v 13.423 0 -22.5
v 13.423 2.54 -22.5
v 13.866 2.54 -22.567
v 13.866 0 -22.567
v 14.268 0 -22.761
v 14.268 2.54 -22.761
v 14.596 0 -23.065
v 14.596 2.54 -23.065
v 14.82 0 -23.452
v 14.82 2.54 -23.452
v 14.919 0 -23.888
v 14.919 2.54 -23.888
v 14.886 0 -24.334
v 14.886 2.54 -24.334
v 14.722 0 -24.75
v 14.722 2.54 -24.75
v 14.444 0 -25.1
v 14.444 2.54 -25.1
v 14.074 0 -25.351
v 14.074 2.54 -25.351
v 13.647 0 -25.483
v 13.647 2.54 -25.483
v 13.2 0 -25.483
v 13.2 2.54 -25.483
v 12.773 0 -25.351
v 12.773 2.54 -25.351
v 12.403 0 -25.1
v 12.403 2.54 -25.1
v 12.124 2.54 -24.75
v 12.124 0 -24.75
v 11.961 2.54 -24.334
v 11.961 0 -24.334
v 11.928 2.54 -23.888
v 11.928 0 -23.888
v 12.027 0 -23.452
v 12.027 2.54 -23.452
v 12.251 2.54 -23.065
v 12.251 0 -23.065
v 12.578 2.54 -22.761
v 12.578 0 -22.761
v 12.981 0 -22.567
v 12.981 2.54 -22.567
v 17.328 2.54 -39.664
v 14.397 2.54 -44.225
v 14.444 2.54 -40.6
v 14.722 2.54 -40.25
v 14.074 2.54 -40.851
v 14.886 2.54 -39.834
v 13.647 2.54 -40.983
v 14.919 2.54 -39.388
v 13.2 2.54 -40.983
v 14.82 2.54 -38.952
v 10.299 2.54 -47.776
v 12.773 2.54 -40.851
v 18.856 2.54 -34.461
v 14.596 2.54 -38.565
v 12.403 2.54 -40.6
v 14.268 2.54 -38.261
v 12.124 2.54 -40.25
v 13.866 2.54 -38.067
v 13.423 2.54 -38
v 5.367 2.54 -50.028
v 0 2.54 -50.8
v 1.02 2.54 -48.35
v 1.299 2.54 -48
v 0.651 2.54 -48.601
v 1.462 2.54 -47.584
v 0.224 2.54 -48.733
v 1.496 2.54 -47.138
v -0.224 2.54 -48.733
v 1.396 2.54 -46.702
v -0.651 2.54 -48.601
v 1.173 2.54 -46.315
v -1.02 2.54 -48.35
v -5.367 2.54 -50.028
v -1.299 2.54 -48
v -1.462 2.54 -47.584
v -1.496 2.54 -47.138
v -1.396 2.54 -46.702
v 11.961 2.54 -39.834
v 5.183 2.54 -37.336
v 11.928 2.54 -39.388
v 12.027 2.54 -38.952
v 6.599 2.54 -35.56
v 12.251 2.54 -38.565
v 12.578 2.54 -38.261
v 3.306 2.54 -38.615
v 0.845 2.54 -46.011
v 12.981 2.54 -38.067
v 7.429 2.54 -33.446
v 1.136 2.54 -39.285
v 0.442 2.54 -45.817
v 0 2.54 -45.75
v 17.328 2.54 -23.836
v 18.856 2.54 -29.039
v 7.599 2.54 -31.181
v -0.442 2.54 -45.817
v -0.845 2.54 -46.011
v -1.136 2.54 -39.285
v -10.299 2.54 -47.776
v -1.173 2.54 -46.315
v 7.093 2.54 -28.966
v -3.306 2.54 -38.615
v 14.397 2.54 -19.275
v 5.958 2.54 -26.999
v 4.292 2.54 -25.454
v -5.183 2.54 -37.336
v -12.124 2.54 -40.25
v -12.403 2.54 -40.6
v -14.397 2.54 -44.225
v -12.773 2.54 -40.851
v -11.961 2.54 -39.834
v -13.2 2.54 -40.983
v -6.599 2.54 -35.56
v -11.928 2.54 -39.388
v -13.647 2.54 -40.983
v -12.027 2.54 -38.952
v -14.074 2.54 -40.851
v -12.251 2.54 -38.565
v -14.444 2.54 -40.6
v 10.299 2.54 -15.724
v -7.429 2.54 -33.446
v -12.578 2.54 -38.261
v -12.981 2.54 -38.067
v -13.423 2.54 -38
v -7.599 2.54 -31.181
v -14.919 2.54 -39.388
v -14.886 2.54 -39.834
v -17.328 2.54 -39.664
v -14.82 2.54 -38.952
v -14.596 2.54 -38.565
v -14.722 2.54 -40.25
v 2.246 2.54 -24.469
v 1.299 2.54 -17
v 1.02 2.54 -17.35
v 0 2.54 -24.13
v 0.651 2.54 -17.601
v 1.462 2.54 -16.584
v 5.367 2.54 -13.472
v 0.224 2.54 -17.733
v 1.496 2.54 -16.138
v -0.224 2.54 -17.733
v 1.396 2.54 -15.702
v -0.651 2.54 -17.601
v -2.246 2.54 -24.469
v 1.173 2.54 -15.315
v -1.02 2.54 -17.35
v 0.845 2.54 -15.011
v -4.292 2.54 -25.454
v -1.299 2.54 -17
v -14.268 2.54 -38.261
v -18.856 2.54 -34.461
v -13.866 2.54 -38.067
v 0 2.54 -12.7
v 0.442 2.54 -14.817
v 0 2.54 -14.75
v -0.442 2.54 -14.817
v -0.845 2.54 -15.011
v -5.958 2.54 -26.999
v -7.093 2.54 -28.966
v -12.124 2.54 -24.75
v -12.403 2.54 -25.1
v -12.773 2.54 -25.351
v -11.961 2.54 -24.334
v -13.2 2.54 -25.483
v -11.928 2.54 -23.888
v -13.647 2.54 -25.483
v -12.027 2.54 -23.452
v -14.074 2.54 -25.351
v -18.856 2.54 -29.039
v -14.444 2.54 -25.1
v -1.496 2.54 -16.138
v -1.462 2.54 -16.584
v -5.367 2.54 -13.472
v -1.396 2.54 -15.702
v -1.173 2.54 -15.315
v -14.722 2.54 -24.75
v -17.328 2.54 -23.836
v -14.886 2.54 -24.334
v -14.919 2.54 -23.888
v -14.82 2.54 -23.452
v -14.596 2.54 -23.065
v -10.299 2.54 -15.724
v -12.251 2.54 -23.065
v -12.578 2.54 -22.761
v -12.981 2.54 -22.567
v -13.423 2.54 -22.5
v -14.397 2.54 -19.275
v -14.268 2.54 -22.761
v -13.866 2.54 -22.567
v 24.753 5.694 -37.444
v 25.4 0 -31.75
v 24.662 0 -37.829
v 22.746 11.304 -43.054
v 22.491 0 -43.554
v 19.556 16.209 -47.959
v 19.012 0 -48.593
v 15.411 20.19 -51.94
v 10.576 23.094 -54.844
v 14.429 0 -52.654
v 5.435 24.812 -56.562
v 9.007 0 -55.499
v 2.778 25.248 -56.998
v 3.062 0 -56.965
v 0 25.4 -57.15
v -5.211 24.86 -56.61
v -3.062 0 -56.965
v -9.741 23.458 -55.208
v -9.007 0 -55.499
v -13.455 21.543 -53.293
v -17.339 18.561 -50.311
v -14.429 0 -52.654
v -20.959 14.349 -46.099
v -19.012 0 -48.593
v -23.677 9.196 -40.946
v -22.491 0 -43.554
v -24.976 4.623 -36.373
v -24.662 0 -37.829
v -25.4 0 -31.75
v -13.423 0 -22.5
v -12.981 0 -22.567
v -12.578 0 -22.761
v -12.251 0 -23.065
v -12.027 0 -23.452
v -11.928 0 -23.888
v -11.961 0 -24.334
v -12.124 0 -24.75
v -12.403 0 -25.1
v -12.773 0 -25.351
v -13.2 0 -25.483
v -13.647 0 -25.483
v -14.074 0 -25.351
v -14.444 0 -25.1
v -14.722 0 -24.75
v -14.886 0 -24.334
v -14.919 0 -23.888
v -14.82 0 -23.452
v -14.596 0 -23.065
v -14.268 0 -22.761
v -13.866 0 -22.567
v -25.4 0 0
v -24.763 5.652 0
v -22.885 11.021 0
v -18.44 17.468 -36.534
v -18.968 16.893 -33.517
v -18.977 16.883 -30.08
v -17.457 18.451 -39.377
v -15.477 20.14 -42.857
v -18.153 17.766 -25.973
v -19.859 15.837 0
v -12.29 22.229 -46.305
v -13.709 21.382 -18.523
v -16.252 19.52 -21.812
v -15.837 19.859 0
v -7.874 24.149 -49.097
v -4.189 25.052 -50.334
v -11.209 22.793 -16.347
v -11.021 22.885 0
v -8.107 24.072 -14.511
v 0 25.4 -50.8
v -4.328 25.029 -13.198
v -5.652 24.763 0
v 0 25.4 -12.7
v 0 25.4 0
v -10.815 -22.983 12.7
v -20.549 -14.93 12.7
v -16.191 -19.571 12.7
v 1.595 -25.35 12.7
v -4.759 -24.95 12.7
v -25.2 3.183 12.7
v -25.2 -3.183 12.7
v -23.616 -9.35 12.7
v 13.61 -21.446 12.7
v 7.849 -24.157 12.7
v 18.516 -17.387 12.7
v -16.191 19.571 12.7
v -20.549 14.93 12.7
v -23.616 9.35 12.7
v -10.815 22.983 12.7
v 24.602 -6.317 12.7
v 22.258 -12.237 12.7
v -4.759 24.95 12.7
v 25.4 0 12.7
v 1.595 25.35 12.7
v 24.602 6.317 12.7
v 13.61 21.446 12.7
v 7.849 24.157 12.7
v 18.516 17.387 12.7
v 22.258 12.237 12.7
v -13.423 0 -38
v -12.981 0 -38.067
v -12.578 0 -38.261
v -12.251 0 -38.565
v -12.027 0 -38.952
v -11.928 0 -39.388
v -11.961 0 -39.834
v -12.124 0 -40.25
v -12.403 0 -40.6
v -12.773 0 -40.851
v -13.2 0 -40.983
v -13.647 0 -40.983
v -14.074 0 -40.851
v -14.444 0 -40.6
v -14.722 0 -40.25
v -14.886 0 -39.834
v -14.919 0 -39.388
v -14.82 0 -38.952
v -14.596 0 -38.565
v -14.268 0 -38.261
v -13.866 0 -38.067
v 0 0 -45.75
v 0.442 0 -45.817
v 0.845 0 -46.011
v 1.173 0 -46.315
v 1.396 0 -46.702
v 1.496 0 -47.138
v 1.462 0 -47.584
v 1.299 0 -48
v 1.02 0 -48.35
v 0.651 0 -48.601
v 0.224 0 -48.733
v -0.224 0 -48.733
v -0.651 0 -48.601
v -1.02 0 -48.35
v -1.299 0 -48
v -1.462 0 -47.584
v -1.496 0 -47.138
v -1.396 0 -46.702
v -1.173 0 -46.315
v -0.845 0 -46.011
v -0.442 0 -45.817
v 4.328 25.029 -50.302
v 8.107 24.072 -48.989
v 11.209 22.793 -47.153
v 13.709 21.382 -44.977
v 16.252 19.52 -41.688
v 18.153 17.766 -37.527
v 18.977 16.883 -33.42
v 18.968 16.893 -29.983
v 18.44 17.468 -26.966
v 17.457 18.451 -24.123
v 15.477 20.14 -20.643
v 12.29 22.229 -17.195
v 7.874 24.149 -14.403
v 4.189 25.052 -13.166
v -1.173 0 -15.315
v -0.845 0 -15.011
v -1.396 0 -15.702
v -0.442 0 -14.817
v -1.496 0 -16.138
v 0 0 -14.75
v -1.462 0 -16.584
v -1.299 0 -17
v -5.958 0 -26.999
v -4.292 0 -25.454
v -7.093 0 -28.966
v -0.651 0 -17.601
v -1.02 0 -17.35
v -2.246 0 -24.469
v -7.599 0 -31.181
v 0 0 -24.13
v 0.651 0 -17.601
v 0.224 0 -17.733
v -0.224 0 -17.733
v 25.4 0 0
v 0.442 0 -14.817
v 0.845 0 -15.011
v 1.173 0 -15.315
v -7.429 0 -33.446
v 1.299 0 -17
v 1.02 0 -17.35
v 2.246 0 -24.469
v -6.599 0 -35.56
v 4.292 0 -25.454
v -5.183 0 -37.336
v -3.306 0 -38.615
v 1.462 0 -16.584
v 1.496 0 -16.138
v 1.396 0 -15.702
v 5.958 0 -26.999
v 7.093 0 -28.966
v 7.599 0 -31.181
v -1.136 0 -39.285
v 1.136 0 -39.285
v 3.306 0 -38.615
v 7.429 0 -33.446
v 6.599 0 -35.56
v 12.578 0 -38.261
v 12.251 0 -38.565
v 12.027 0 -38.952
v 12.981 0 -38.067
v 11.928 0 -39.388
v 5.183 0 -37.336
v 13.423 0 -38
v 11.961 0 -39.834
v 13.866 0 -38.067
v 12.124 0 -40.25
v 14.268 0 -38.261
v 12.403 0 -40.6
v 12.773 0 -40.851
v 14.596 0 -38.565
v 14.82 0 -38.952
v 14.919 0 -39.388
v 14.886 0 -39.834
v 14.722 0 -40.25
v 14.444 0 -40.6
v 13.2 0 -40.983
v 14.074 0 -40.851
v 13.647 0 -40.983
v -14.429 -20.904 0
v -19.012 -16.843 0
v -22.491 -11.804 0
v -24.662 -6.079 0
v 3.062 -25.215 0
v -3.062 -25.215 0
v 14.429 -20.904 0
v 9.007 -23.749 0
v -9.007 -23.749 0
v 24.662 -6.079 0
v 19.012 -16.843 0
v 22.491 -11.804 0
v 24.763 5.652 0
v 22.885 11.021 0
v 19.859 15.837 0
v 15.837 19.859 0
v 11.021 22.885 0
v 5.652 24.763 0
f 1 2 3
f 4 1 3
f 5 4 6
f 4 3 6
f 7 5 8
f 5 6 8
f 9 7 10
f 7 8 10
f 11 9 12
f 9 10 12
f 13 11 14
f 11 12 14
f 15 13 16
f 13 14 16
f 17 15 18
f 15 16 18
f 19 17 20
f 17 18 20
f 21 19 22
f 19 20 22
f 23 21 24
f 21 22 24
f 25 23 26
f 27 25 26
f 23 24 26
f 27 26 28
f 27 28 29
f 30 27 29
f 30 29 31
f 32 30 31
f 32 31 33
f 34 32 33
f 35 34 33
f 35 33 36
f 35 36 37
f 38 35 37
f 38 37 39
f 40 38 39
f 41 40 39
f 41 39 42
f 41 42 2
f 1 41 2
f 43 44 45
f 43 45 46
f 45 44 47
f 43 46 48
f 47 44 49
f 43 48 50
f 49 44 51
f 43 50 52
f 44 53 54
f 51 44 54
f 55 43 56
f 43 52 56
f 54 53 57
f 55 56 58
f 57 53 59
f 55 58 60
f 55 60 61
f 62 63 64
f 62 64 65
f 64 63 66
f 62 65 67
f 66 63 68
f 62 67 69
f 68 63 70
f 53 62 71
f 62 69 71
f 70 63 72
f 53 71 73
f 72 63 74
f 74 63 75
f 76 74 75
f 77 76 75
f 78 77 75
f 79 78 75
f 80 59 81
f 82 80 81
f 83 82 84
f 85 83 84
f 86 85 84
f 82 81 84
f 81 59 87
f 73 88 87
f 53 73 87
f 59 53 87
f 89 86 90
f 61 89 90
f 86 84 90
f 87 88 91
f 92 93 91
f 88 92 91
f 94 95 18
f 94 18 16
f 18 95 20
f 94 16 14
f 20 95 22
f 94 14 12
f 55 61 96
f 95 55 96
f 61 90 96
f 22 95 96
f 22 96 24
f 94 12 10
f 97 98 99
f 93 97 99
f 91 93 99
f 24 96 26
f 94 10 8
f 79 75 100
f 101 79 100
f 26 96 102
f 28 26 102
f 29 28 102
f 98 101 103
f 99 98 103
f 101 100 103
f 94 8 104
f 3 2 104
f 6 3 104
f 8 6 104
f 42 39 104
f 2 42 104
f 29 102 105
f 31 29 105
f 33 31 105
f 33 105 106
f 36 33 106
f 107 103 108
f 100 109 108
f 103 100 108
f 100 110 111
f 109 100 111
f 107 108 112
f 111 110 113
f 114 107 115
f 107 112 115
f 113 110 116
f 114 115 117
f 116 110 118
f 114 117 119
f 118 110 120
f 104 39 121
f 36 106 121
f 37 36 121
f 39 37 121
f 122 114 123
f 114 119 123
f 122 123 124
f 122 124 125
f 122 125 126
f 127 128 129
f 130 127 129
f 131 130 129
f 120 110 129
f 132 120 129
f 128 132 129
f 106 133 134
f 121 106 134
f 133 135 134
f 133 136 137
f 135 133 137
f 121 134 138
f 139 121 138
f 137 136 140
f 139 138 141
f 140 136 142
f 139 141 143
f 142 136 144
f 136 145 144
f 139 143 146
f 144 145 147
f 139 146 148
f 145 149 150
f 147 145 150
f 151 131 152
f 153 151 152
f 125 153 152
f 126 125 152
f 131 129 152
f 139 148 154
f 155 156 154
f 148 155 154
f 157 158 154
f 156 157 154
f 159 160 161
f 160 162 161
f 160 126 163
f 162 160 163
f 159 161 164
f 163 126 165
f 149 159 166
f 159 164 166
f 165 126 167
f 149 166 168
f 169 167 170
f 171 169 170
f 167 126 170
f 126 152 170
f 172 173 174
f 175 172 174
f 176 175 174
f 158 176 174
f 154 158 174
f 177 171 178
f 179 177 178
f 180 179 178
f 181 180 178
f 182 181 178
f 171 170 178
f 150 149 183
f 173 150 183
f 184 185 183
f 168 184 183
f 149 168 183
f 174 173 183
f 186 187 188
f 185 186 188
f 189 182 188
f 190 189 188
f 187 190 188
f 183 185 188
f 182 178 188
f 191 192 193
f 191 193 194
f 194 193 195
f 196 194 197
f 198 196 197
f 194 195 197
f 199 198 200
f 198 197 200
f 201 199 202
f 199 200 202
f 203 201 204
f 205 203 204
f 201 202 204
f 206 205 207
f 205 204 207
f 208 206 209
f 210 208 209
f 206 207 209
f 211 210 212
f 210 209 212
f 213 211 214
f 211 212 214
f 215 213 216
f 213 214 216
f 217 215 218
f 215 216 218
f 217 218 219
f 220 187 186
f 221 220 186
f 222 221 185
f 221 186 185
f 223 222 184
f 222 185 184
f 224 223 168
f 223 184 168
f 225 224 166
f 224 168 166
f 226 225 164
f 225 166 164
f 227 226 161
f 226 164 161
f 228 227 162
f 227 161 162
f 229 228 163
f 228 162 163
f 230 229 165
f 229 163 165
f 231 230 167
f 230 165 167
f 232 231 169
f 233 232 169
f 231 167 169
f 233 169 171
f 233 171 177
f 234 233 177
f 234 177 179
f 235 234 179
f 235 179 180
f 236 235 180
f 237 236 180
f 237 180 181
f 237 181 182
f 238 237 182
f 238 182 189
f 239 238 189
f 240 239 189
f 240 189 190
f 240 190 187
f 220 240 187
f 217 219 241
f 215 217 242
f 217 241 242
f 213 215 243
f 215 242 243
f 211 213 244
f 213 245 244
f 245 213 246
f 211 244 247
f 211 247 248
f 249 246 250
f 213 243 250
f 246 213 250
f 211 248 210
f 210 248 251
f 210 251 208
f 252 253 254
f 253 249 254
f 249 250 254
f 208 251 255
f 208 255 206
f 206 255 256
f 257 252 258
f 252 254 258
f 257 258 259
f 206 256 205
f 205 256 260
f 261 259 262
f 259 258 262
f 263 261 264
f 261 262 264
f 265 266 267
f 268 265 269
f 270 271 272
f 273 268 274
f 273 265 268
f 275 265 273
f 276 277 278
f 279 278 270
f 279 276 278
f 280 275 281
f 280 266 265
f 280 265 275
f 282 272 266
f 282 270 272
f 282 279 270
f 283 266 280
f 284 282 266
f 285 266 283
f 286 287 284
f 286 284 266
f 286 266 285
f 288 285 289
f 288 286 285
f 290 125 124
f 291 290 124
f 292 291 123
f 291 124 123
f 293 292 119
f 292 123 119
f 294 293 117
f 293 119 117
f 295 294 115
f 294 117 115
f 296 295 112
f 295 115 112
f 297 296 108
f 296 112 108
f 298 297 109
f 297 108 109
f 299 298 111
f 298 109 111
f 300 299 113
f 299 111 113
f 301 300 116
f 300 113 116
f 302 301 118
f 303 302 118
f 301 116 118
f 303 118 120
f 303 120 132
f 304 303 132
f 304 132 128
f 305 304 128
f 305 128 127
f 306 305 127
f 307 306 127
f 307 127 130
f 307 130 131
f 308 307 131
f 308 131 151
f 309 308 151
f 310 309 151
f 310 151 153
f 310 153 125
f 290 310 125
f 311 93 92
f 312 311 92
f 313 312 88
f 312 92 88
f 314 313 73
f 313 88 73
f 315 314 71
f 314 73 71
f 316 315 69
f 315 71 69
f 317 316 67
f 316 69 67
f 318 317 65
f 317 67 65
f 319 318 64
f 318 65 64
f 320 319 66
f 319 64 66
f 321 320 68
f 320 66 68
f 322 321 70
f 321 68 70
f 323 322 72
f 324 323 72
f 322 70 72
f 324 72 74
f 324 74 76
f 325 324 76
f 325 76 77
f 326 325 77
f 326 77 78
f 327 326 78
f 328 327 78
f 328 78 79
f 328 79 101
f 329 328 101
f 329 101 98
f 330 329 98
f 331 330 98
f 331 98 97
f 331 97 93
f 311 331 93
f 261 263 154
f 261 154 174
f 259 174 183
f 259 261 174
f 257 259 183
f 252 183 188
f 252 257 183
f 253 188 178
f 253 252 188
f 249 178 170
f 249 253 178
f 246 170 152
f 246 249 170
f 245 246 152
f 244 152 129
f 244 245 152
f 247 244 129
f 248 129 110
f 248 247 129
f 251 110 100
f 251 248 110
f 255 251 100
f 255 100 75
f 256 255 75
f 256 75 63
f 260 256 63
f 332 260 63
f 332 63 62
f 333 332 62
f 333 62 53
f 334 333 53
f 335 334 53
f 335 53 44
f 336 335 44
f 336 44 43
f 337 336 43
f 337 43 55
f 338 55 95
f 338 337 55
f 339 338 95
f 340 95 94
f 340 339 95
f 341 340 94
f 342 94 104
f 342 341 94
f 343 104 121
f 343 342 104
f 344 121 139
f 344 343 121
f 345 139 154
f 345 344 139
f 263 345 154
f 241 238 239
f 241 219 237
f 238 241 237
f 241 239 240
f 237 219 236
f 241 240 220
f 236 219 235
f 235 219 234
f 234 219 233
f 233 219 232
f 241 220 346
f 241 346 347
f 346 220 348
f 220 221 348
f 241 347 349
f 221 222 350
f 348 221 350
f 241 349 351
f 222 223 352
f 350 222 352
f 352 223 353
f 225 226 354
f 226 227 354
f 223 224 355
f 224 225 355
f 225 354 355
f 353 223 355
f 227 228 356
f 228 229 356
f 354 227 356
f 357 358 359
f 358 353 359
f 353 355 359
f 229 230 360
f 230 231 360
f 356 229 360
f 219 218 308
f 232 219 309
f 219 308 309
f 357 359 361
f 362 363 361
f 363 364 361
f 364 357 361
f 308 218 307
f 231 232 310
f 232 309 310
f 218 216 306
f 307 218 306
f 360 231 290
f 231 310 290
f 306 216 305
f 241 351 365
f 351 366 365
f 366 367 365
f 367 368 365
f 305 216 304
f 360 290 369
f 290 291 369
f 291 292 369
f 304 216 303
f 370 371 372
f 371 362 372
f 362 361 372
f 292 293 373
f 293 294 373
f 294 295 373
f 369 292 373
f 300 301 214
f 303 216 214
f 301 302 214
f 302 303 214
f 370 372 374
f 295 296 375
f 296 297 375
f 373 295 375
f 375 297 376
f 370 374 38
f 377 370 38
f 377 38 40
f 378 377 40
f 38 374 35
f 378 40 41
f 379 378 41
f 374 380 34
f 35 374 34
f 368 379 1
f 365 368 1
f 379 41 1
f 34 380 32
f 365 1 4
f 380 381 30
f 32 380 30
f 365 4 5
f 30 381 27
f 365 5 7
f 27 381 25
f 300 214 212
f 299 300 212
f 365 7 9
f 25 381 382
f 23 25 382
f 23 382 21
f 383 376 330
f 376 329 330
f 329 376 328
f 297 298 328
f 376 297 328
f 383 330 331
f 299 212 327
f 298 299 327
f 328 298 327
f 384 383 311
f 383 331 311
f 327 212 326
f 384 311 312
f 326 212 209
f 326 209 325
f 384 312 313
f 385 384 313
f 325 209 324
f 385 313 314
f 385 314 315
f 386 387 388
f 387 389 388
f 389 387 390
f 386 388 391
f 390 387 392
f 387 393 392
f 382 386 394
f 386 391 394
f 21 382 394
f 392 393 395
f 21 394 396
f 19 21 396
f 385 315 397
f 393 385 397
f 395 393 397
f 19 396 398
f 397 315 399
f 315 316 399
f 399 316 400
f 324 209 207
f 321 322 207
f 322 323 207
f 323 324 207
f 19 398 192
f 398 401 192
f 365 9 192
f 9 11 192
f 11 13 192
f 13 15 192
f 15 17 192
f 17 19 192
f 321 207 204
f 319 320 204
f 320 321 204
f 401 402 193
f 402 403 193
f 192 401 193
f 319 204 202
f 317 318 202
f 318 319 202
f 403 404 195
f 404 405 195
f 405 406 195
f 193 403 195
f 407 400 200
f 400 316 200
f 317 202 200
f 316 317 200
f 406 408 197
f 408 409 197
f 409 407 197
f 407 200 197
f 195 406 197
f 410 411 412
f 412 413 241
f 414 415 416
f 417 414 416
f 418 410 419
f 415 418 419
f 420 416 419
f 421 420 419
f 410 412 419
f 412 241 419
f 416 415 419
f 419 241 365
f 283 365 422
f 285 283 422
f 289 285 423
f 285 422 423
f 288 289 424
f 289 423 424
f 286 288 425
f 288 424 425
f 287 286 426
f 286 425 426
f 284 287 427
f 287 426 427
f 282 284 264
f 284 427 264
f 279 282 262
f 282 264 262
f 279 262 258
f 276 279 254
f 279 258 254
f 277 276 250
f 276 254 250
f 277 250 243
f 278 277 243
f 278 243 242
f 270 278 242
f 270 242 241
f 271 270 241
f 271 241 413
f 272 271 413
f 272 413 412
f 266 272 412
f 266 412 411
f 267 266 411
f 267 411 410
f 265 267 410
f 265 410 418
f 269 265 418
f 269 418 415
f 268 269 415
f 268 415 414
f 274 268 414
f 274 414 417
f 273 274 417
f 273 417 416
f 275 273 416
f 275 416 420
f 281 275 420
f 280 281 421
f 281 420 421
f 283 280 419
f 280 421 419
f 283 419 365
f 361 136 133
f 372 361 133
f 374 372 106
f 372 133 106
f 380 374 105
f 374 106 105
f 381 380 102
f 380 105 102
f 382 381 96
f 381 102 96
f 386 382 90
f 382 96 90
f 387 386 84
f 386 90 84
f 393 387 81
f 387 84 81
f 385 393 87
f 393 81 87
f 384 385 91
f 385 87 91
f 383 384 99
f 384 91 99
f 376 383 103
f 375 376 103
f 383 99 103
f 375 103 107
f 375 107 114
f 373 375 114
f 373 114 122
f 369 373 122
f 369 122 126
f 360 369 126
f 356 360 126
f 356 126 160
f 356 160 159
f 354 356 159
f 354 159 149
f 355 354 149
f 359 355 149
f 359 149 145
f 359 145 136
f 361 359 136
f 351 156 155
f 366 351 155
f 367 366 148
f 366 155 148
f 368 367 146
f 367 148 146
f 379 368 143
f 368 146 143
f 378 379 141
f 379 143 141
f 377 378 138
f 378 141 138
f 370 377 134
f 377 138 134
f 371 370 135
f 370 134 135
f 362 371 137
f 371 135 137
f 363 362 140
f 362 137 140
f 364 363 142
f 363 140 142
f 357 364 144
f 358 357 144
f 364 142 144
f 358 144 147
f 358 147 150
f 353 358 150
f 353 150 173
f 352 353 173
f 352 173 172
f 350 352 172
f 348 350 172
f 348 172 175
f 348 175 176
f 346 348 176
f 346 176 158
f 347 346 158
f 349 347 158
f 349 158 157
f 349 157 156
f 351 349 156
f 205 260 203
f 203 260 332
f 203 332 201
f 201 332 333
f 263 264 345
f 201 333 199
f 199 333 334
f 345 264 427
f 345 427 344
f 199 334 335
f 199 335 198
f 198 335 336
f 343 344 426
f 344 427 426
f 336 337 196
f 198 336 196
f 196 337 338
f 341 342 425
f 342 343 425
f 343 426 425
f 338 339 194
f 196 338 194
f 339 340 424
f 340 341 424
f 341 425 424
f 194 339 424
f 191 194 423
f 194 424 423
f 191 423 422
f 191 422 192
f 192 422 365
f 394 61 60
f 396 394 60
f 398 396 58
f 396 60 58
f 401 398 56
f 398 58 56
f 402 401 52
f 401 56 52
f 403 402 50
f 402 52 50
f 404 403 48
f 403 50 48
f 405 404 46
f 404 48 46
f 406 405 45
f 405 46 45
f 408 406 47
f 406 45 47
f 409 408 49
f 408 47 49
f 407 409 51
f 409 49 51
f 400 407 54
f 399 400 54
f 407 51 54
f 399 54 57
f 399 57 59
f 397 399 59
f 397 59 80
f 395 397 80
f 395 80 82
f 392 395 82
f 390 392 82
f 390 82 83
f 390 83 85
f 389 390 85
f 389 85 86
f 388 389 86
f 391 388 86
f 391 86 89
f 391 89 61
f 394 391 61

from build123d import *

# Parameters (mm, degrees)
SKETCH1_R           = 25.4
BOSS_EXTRUDE1_DEPTH = 12.7
SKETCH2_R           = 25.4
SKETCH2_W           = 50.8
SKETCH2_H           = 31.75
BOSS_EXTRUDE2_DEPTH = 25.4
SKETCH4_R           = 19.05
CUT_EXTRUDE2_DEPTH  = 22.86
CUT_EXTRUDE1_DEPTH  = 68.501425911
SKETCH5_R           = 7.62
SKETCH5_R_2         = 1.5
CUT_EXTRUDE3_DEPTH  = 69.497635846


with BuildPart() as part:
    # Sketch1 → Boss-Extrude1 (new body)
    with BuildSketch(Plane.XY):
        Circle(SKETCH1_R)
    extrude(amount=BOSS_EXTRUDE1_DEPTH)

    # Sketch2 → Boss-Extrude2 (add)
    with BuildSketch(Plane(origin=(0, 0, 0), x_dir=(1, 0, 0), z_dir=(0, 1, 0))):
        with Locations((0, 31.75)):
            Circle(SKETCH2_R)
        with Locations((0, 15.875)):
            Rectangle(SKETCH2_W, SKETCH2_H)
    extrude(amount=BOSS_EXTRUDE2_DEPTH)

    # Sketch4 → Cut-Extrude2 (cut)
    with BuildSketch(Plane.XZ.offset(-25.4)):
        with Locations(Location((0, -31.75, 0), (0, 0, 90))):
            Circle(SKETCH4_R)
    extrude(amount=CUT_EXTRUDE2_DEPTH, mode=Mode.SUBTRACT)

    # Sketch3 → Cut-Extrude1 (cut, through all)
    with BuildSketch(Plane.XY):
        with BuildLine():
            ThreePointArc((0, 25.4), (17.960512242, 17.960512242), (25.4, 0))
            Line((25.4, 0), (25.4, 25.4))
            Line((25.4, 25.4), (0, 25.4))
        make_face()
        with BuildLine():
            ThreePointArc((-25.4, 0), (-17.960512242, 17.960512242), (0, 25.4))
            Line((0, 25.4), (-25.4, 25.4))
            Line((-25.4, 25.4), (-25.4, 0))
        make_face()
    extrude(amount=-CUT_EXTRUDE1_DEPTH, mode=Mode.SUBTRACT)

    # Sketch5 → Cut-Extrude3 (cut, through all)
    with BuildSketch(Plane(origin=(0, 2.54, 0), x_dir=(1, 0, 0), z_dir=(0, 1, 0))):
        with Locations(Location((0, 31.75, 0), (0, 0, 270))):
            Circle(SKETCH5_R)
        with Locations(Location((0, 47.249999988, 0), (0, 0, 270))):
            Circle(SKETCH5_R_2)
        with Locations(Location((13.423393748, 39.499999994, 0), (0, 0, 270))):
            Circle(SKETCH5_R_2)
        with Locations(Location((13.423393748, 24.000000006, 0), (0, 0, 270))):
            Circle(SKETCH5_R_2)
        with Locations(Location((0, 16.250000012, 0), (0, 0, 270))):
            Circle(SKETCH5_R_2)
        with Locations(Location((-13.423393748, 24.000000006, 0), (0, 0, 270))):
            Circle(SKETCH5_R_2)
        with Locations(Location((-13.423393748, 39.499999994, 0), (0, 0, 270))):
            Circle(SKETCH5_R_2)
    extrude(amount=-CUT_EXTRUDE3_DEPTH, mode=Mode.SUBTRACT)


solid = part.part
